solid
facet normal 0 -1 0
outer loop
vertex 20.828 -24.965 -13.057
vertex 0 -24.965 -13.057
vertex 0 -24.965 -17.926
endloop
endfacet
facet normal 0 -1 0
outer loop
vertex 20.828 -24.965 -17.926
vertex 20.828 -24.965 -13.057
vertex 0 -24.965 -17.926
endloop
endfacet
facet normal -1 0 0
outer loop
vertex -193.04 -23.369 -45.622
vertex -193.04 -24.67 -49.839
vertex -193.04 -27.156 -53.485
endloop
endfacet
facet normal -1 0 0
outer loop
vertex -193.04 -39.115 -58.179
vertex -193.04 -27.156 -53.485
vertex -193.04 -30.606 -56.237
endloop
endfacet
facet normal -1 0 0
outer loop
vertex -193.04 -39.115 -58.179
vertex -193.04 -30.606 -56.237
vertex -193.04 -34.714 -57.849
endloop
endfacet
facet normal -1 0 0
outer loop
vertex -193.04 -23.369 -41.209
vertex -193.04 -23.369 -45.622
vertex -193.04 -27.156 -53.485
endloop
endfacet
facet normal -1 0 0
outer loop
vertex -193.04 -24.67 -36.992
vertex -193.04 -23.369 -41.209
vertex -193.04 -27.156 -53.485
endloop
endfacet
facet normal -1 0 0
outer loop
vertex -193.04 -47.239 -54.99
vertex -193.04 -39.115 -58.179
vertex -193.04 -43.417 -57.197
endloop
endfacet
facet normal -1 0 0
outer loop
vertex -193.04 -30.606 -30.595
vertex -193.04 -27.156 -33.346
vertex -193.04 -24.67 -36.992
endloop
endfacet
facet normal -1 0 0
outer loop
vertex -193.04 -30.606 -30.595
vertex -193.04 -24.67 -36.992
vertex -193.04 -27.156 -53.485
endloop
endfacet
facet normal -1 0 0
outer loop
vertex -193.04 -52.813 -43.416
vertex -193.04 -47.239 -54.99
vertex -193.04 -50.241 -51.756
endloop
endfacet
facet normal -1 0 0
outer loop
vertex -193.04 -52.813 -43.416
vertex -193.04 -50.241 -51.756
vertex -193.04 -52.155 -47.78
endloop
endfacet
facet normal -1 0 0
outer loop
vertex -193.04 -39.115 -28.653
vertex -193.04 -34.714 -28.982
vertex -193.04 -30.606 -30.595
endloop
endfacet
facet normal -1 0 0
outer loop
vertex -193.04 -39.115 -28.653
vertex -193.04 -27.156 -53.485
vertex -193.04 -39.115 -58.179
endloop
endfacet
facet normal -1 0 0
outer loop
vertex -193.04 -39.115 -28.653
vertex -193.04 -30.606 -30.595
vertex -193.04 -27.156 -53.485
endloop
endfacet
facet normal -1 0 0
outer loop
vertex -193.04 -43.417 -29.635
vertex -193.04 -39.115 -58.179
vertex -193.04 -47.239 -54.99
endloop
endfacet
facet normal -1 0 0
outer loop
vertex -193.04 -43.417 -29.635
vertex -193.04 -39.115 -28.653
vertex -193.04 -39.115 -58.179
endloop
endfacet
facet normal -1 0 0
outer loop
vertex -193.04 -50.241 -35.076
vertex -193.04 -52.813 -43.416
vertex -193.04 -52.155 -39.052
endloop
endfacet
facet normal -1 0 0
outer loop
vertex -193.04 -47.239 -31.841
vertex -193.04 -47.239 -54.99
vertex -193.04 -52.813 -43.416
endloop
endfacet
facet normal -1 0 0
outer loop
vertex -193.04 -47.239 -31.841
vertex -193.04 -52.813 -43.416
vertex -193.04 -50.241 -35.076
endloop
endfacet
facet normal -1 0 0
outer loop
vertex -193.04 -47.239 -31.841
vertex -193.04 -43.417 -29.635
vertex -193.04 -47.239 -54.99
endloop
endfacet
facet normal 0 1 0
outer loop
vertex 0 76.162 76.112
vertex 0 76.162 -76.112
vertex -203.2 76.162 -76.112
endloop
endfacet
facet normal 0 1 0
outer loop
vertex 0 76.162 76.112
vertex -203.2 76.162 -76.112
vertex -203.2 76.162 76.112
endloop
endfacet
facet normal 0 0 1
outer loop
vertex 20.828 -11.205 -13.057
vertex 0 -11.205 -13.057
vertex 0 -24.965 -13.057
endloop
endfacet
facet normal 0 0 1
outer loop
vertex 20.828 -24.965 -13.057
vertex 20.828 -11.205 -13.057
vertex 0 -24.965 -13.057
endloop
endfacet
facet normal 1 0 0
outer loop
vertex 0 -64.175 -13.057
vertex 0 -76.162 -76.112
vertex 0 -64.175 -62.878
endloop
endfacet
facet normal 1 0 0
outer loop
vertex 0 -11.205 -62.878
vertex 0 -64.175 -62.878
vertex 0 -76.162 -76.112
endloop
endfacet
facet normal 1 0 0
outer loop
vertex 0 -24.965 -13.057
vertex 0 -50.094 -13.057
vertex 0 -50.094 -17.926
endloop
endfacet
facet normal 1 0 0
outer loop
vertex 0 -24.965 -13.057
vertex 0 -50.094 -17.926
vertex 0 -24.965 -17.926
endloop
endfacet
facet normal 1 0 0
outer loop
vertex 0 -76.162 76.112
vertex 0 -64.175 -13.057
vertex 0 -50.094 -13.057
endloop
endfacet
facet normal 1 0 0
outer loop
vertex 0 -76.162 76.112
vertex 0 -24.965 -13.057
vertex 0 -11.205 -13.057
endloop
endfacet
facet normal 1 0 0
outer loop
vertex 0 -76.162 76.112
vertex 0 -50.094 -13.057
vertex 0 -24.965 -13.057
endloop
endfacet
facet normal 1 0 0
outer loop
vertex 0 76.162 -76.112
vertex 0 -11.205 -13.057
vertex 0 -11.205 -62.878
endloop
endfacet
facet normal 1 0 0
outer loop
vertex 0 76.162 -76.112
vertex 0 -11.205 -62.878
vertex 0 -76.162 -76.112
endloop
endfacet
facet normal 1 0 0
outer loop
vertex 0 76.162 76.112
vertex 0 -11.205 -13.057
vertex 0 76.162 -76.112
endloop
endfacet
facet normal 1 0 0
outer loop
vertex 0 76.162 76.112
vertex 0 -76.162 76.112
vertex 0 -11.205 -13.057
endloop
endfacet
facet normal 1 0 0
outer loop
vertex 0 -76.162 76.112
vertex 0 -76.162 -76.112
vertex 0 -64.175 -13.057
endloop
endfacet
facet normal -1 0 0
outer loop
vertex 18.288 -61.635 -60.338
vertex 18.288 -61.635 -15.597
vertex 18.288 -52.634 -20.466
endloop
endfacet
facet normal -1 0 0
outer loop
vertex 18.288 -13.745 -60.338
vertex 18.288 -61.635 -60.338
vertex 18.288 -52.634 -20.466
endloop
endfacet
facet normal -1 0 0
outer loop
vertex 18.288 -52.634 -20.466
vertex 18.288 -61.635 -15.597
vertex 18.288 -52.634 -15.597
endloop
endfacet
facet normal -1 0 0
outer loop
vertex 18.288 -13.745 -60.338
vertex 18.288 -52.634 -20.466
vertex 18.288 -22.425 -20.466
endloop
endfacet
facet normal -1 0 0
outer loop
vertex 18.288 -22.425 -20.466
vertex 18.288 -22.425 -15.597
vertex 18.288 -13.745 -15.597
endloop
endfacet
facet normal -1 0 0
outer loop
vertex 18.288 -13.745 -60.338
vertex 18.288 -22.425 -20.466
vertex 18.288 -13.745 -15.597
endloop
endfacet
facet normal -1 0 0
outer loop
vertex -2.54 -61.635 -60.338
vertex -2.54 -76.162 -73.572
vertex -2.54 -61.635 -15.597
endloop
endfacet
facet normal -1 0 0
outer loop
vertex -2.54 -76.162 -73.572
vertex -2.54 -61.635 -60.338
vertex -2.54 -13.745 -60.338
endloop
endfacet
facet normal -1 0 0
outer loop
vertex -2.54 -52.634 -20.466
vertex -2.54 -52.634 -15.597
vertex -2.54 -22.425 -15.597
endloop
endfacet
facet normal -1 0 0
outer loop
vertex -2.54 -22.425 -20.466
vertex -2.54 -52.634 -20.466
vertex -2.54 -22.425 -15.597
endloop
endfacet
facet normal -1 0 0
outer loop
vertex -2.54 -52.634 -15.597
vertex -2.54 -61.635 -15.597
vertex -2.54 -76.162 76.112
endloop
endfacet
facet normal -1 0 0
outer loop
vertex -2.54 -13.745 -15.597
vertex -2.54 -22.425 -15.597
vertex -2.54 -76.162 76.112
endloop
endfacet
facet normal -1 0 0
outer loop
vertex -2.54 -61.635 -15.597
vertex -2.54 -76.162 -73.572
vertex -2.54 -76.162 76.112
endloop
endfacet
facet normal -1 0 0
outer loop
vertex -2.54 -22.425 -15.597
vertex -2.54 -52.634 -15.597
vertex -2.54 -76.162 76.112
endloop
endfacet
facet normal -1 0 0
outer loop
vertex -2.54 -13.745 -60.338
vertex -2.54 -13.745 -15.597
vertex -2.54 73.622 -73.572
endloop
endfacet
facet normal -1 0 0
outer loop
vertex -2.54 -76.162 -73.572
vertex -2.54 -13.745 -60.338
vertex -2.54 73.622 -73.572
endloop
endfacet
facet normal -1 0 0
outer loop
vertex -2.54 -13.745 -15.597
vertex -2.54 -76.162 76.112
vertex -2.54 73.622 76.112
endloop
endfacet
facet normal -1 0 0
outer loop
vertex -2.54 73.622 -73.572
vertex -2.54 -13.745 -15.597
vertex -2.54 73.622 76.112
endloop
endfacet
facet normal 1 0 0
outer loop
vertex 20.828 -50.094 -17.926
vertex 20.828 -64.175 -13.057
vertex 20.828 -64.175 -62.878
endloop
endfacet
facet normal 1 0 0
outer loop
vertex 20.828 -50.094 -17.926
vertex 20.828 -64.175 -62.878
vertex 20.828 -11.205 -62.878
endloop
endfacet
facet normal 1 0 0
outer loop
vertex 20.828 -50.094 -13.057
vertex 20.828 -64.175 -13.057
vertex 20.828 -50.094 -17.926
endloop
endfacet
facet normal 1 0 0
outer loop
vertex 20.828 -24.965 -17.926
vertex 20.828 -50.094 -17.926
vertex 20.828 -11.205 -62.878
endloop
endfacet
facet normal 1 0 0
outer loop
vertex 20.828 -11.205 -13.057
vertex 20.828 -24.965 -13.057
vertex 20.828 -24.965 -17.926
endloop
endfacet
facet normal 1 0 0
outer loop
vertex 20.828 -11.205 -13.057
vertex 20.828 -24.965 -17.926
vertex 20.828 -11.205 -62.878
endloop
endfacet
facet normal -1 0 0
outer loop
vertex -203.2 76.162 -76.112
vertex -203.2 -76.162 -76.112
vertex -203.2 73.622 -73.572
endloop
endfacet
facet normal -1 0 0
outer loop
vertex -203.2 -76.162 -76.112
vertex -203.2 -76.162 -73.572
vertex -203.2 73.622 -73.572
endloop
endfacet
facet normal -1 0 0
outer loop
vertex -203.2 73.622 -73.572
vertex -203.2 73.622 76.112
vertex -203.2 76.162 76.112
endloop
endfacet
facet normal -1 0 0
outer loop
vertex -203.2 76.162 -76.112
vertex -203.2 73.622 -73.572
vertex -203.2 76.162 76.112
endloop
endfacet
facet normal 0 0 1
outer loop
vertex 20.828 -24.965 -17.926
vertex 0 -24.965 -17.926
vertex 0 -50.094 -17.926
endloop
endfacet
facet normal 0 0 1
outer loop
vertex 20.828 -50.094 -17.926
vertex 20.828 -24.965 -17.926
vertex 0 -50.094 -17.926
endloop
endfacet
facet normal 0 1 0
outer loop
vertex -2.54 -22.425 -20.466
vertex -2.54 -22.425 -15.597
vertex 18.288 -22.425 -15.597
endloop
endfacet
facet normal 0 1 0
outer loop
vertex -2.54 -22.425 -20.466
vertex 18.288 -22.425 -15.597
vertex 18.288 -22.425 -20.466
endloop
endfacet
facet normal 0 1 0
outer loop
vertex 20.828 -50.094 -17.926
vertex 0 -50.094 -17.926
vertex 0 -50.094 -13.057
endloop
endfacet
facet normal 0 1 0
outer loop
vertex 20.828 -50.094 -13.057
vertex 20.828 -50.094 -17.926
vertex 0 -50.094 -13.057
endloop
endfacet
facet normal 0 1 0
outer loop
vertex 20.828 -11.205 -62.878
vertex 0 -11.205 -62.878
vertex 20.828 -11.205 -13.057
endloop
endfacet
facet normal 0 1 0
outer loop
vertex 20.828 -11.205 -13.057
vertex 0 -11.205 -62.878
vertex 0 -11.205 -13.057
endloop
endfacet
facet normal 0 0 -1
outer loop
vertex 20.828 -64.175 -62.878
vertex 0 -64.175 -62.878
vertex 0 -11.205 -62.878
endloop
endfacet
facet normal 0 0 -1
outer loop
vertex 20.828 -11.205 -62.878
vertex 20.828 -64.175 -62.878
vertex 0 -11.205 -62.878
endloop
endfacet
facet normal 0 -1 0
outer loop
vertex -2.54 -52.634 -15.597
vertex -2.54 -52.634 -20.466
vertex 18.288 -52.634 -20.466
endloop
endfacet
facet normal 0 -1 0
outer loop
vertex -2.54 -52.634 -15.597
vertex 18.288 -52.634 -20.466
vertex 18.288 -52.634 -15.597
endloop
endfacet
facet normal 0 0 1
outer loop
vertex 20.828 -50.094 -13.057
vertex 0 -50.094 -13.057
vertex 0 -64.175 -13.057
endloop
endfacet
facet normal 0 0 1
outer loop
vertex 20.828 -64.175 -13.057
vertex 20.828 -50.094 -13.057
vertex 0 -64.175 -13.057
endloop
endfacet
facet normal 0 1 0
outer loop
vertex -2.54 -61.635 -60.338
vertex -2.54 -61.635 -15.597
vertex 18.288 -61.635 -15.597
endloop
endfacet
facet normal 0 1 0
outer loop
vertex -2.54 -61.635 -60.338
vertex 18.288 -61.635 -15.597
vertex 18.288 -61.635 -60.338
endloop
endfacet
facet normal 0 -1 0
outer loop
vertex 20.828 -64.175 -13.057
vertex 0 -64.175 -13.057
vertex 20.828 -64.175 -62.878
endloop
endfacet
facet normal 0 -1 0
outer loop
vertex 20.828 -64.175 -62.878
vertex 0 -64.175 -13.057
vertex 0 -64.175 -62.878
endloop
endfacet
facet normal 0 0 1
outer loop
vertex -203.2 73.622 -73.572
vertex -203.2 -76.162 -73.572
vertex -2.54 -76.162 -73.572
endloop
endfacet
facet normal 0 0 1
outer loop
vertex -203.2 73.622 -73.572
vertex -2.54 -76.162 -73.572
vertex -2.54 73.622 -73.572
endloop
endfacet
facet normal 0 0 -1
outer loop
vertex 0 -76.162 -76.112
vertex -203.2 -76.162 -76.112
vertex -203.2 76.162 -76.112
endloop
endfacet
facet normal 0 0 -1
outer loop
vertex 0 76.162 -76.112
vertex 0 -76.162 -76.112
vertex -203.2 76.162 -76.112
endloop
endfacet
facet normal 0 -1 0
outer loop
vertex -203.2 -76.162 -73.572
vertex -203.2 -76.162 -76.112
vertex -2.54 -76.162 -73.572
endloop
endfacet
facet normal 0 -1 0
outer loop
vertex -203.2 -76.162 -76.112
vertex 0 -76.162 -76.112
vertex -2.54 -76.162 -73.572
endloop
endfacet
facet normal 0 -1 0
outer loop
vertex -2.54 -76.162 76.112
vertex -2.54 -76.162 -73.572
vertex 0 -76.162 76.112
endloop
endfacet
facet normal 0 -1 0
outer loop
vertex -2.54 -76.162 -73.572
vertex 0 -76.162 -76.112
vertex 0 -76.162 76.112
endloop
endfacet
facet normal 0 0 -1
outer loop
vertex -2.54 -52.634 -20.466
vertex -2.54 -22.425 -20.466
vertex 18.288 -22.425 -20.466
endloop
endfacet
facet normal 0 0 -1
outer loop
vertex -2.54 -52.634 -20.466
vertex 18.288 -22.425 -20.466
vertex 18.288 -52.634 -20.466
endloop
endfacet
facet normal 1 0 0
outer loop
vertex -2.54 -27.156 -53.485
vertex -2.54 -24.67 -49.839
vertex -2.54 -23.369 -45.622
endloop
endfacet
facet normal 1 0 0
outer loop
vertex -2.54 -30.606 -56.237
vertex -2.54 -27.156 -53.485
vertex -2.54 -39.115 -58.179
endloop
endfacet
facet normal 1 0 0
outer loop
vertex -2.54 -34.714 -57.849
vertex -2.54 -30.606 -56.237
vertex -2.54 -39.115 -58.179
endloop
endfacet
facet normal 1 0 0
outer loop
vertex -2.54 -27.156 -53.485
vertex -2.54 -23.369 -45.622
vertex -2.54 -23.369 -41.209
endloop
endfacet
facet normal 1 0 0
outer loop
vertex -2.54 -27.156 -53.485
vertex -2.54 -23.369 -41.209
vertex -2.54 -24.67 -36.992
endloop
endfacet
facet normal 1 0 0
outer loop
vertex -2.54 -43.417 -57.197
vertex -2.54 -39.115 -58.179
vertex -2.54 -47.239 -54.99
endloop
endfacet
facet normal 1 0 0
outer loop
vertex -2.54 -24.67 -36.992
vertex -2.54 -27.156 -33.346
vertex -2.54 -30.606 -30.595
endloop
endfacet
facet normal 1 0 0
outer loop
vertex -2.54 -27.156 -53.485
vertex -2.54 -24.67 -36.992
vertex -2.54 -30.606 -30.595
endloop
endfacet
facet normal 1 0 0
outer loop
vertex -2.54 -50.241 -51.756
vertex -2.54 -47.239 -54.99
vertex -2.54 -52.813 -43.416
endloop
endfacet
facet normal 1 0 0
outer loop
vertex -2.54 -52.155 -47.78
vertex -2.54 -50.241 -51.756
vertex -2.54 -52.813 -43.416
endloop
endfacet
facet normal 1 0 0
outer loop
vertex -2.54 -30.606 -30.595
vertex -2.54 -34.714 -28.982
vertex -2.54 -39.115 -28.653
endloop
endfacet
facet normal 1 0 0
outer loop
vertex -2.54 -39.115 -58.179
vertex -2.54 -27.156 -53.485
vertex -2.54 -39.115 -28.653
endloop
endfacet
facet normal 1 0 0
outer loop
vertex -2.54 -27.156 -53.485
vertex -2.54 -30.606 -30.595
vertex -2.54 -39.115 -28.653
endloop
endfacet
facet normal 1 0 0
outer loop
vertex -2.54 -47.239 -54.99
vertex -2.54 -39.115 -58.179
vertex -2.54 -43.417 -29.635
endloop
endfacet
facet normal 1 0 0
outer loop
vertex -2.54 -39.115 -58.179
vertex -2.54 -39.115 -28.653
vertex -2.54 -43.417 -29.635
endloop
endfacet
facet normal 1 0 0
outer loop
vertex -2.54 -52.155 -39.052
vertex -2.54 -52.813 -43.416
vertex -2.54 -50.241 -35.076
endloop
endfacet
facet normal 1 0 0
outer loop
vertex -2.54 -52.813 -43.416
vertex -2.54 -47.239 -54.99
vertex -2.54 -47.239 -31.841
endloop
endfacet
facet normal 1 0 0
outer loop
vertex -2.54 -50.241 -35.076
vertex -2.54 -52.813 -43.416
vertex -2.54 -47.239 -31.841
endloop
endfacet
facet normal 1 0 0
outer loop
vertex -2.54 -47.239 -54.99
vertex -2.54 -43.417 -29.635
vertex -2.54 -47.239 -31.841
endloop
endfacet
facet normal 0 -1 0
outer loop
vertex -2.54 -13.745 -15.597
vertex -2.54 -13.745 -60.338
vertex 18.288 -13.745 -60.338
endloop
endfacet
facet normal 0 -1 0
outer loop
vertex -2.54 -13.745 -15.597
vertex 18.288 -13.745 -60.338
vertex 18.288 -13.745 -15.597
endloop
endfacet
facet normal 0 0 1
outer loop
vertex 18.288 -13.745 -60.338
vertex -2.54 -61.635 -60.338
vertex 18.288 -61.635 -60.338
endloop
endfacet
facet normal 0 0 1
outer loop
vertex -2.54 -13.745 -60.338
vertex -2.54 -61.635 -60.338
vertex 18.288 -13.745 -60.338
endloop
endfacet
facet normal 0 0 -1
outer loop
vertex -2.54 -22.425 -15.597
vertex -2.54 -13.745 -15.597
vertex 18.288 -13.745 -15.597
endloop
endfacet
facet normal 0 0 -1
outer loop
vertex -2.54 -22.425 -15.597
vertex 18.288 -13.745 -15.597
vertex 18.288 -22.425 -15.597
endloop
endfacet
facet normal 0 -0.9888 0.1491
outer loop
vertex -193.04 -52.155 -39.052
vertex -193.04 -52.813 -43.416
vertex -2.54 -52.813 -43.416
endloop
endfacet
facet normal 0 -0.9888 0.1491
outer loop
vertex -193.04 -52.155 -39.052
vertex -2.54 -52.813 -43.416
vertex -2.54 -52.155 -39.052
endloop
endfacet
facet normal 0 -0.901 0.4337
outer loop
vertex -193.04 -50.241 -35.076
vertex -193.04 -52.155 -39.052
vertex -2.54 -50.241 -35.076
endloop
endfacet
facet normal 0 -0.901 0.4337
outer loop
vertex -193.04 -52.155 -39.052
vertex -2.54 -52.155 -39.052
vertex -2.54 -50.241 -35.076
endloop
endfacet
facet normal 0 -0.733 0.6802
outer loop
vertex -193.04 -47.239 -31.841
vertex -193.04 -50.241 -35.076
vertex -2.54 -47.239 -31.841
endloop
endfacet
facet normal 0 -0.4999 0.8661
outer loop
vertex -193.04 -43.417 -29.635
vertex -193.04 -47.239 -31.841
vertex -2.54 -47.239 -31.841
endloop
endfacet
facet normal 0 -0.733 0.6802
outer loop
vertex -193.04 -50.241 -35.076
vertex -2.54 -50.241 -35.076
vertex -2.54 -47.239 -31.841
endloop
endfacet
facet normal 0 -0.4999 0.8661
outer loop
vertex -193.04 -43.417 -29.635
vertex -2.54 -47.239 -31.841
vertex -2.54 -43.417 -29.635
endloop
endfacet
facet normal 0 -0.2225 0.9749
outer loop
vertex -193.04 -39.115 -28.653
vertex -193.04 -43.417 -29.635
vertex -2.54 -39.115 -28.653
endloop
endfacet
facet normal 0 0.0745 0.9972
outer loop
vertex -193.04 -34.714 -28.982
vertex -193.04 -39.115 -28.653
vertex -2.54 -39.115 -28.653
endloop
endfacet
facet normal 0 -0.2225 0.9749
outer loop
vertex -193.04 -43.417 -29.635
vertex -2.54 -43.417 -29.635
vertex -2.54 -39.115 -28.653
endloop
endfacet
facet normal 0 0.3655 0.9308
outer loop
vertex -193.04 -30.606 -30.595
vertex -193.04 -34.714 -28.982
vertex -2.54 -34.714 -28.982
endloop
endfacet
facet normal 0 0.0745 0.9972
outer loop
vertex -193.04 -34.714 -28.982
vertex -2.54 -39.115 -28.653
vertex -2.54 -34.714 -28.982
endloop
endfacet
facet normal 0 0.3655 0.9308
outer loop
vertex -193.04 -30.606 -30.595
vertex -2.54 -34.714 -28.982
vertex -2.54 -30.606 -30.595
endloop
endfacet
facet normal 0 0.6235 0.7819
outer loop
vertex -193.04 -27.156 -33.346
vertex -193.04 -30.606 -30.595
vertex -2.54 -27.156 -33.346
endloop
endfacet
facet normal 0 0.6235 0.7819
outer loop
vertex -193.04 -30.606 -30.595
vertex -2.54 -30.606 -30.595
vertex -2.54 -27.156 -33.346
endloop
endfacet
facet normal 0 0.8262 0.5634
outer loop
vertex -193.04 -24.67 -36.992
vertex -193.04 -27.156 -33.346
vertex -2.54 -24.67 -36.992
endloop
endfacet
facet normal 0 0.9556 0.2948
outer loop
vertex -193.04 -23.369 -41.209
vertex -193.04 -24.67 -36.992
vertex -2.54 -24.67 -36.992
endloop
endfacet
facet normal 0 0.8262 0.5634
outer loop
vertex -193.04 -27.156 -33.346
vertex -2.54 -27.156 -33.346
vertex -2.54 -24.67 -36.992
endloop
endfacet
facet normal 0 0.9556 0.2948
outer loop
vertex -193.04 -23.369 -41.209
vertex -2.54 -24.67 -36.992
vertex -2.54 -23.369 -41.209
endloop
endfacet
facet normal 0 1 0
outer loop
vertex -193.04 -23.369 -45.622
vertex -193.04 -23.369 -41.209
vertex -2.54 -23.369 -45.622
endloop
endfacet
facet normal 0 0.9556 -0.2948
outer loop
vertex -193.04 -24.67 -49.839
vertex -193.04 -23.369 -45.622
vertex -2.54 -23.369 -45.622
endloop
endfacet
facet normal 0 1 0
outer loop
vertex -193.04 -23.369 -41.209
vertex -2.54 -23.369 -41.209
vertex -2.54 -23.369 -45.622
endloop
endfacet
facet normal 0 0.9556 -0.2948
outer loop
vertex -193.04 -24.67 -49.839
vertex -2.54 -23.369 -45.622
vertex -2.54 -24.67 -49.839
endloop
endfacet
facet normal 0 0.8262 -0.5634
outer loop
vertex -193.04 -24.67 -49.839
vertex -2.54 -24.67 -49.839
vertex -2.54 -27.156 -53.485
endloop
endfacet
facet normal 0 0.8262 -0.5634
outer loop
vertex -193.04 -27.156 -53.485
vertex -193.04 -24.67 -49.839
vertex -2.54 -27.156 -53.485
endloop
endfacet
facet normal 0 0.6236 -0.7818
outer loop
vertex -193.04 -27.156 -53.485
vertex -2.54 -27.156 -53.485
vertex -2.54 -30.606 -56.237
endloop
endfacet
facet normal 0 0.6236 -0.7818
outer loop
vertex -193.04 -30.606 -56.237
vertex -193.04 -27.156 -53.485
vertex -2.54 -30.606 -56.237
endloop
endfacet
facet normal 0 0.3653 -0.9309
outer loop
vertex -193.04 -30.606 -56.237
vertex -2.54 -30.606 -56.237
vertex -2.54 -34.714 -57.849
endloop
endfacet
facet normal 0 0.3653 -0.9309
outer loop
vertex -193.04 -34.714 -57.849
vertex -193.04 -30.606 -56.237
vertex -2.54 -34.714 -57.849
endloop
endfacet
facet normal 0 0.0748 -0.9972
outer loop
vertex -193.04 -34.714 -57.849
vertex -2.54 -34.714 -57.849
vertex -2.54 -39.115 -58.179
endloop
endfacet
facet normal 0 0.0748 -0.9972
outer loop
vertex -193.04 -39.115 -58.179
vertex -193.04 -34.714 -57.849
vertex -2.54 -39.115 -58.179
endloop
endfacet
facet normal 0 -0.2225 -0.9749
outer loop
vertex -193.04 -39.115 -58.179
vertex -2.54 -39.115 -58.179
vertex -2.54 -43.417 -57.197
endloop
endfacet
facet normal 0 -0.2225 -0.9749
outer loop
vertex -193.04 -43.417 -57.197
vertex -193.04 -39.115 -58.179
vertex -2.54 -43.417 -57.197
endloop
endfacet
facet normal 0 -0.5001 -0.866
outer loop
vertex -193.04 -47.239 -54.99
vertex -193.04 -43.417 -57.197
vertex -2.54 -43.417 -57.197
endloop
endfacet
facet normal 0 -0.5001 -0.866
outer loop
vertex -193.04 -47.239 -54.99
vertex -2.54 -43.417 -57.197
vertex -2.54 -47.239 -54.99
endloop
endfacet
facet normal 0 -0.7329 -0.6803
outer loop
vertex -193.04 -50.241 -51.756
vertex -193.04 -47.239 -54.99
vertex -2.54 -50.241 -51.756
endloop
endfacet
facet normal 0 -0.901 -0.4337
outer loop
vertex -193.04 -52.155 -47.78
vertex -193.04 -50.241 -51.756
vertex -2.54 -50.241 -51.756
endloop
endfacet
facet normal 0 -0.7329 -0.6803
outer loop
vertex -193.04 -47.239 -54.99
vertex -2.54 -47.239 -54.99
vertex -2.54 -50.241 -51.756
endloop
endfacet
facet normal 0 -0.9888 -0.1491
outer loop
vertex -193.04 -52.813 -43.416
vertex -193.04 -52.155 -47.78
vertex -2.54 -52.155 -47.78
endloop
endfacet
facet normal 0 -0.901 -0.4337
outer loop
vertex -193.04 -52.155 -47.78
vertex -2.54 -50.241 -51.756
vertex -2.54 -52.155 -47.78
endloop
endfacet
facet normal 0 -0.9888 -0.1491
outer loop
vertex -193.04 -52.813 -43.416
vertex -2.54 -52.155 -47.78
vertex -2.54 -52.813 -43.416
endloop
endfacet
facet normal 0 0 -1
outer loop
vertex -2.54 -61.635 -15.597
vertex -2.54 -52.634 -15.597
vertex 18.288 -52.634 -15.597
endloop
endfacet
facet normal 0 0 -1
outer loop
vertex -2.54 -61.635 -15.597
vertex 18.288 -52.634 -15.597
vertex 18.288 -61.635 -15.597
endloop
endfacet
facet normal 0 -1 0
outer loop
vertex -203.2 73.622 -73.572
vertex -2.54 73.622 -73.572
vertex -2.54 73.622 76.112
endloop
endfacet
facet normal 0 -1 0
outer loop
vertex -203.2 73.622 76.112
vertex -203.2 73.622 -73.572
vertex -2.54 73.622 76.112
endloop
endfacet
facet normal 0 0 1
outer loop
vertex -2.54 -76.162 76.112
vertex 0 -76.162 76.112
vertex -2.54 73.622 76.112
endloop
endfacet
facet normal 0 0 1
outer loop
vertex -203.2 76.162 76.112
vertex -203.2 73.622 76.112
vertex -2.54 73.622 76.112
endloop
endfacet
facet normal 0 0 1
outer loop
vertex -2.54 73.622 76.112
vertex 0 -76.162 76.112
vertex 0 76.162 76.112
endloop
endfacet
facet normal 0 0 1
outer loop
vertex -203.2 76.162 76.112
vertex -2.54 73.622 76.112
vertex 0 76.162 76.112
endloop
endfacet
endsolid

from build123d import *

# Parameters (mm, degrees)
F0_W     = 152.3237526417
F0_H     = 152.2235125303
F1_DEPTH = 203.2
F3_DEPTH = 20.828
F4_T     = -2.54
F5_R     = 14.8045645705
F6_DEPTH = 190.5


with BuildPart() as f1:
    # F0 (on Right) → F1 (new body)
    with BuildSketch(Plane.YZ):
        Rectangle(F0_W, F0_H)
    extrude(amount=-F1_DEPTH)

    # F2 (on face) → F3 (join)
    with BuildSketch(Plane.YZ):
        Polygon((-64.1746893525, -13.0571881309), (-64.1746893525, -62.878228724), (-11.205105111, -62.878228724), (-11.205105111, -13.0571881309), (-24.9650161713, -13.0571881309), (-24.9650161713, -17.9264117032), (-50.0936061144, -17.9264117032), (-50.0936061144, -13.0571881309), align=None)
    extrude(amount=F3_DEPTH)

    # F4
    f4_openings = [f1.faces().sort_by_distance(p)[0] for p in [
        (-101.6, -76.161876, 0),
        (-101.6, 0, 76.111756),
        (-203.2, 0, 0),
    ]]
    offset(amount=F4_T, openings=f4_openings, kind=Kind.INTERSECTION)


with BuildPart() as f6:
    # F5 (on face) → F6 (new body)
    with BuildSketch(Plane(origin=(-2.54, 0, 0), x_dir=(0, -1, 0), z_dir=(-1, 0, 0))):
        with Locations((38.0085924748, -43.4158226097)):
            Circle(F5_R)
    extrude(amount=F6_DEPTH)


solid = Compound([f1.part, f6.part])
